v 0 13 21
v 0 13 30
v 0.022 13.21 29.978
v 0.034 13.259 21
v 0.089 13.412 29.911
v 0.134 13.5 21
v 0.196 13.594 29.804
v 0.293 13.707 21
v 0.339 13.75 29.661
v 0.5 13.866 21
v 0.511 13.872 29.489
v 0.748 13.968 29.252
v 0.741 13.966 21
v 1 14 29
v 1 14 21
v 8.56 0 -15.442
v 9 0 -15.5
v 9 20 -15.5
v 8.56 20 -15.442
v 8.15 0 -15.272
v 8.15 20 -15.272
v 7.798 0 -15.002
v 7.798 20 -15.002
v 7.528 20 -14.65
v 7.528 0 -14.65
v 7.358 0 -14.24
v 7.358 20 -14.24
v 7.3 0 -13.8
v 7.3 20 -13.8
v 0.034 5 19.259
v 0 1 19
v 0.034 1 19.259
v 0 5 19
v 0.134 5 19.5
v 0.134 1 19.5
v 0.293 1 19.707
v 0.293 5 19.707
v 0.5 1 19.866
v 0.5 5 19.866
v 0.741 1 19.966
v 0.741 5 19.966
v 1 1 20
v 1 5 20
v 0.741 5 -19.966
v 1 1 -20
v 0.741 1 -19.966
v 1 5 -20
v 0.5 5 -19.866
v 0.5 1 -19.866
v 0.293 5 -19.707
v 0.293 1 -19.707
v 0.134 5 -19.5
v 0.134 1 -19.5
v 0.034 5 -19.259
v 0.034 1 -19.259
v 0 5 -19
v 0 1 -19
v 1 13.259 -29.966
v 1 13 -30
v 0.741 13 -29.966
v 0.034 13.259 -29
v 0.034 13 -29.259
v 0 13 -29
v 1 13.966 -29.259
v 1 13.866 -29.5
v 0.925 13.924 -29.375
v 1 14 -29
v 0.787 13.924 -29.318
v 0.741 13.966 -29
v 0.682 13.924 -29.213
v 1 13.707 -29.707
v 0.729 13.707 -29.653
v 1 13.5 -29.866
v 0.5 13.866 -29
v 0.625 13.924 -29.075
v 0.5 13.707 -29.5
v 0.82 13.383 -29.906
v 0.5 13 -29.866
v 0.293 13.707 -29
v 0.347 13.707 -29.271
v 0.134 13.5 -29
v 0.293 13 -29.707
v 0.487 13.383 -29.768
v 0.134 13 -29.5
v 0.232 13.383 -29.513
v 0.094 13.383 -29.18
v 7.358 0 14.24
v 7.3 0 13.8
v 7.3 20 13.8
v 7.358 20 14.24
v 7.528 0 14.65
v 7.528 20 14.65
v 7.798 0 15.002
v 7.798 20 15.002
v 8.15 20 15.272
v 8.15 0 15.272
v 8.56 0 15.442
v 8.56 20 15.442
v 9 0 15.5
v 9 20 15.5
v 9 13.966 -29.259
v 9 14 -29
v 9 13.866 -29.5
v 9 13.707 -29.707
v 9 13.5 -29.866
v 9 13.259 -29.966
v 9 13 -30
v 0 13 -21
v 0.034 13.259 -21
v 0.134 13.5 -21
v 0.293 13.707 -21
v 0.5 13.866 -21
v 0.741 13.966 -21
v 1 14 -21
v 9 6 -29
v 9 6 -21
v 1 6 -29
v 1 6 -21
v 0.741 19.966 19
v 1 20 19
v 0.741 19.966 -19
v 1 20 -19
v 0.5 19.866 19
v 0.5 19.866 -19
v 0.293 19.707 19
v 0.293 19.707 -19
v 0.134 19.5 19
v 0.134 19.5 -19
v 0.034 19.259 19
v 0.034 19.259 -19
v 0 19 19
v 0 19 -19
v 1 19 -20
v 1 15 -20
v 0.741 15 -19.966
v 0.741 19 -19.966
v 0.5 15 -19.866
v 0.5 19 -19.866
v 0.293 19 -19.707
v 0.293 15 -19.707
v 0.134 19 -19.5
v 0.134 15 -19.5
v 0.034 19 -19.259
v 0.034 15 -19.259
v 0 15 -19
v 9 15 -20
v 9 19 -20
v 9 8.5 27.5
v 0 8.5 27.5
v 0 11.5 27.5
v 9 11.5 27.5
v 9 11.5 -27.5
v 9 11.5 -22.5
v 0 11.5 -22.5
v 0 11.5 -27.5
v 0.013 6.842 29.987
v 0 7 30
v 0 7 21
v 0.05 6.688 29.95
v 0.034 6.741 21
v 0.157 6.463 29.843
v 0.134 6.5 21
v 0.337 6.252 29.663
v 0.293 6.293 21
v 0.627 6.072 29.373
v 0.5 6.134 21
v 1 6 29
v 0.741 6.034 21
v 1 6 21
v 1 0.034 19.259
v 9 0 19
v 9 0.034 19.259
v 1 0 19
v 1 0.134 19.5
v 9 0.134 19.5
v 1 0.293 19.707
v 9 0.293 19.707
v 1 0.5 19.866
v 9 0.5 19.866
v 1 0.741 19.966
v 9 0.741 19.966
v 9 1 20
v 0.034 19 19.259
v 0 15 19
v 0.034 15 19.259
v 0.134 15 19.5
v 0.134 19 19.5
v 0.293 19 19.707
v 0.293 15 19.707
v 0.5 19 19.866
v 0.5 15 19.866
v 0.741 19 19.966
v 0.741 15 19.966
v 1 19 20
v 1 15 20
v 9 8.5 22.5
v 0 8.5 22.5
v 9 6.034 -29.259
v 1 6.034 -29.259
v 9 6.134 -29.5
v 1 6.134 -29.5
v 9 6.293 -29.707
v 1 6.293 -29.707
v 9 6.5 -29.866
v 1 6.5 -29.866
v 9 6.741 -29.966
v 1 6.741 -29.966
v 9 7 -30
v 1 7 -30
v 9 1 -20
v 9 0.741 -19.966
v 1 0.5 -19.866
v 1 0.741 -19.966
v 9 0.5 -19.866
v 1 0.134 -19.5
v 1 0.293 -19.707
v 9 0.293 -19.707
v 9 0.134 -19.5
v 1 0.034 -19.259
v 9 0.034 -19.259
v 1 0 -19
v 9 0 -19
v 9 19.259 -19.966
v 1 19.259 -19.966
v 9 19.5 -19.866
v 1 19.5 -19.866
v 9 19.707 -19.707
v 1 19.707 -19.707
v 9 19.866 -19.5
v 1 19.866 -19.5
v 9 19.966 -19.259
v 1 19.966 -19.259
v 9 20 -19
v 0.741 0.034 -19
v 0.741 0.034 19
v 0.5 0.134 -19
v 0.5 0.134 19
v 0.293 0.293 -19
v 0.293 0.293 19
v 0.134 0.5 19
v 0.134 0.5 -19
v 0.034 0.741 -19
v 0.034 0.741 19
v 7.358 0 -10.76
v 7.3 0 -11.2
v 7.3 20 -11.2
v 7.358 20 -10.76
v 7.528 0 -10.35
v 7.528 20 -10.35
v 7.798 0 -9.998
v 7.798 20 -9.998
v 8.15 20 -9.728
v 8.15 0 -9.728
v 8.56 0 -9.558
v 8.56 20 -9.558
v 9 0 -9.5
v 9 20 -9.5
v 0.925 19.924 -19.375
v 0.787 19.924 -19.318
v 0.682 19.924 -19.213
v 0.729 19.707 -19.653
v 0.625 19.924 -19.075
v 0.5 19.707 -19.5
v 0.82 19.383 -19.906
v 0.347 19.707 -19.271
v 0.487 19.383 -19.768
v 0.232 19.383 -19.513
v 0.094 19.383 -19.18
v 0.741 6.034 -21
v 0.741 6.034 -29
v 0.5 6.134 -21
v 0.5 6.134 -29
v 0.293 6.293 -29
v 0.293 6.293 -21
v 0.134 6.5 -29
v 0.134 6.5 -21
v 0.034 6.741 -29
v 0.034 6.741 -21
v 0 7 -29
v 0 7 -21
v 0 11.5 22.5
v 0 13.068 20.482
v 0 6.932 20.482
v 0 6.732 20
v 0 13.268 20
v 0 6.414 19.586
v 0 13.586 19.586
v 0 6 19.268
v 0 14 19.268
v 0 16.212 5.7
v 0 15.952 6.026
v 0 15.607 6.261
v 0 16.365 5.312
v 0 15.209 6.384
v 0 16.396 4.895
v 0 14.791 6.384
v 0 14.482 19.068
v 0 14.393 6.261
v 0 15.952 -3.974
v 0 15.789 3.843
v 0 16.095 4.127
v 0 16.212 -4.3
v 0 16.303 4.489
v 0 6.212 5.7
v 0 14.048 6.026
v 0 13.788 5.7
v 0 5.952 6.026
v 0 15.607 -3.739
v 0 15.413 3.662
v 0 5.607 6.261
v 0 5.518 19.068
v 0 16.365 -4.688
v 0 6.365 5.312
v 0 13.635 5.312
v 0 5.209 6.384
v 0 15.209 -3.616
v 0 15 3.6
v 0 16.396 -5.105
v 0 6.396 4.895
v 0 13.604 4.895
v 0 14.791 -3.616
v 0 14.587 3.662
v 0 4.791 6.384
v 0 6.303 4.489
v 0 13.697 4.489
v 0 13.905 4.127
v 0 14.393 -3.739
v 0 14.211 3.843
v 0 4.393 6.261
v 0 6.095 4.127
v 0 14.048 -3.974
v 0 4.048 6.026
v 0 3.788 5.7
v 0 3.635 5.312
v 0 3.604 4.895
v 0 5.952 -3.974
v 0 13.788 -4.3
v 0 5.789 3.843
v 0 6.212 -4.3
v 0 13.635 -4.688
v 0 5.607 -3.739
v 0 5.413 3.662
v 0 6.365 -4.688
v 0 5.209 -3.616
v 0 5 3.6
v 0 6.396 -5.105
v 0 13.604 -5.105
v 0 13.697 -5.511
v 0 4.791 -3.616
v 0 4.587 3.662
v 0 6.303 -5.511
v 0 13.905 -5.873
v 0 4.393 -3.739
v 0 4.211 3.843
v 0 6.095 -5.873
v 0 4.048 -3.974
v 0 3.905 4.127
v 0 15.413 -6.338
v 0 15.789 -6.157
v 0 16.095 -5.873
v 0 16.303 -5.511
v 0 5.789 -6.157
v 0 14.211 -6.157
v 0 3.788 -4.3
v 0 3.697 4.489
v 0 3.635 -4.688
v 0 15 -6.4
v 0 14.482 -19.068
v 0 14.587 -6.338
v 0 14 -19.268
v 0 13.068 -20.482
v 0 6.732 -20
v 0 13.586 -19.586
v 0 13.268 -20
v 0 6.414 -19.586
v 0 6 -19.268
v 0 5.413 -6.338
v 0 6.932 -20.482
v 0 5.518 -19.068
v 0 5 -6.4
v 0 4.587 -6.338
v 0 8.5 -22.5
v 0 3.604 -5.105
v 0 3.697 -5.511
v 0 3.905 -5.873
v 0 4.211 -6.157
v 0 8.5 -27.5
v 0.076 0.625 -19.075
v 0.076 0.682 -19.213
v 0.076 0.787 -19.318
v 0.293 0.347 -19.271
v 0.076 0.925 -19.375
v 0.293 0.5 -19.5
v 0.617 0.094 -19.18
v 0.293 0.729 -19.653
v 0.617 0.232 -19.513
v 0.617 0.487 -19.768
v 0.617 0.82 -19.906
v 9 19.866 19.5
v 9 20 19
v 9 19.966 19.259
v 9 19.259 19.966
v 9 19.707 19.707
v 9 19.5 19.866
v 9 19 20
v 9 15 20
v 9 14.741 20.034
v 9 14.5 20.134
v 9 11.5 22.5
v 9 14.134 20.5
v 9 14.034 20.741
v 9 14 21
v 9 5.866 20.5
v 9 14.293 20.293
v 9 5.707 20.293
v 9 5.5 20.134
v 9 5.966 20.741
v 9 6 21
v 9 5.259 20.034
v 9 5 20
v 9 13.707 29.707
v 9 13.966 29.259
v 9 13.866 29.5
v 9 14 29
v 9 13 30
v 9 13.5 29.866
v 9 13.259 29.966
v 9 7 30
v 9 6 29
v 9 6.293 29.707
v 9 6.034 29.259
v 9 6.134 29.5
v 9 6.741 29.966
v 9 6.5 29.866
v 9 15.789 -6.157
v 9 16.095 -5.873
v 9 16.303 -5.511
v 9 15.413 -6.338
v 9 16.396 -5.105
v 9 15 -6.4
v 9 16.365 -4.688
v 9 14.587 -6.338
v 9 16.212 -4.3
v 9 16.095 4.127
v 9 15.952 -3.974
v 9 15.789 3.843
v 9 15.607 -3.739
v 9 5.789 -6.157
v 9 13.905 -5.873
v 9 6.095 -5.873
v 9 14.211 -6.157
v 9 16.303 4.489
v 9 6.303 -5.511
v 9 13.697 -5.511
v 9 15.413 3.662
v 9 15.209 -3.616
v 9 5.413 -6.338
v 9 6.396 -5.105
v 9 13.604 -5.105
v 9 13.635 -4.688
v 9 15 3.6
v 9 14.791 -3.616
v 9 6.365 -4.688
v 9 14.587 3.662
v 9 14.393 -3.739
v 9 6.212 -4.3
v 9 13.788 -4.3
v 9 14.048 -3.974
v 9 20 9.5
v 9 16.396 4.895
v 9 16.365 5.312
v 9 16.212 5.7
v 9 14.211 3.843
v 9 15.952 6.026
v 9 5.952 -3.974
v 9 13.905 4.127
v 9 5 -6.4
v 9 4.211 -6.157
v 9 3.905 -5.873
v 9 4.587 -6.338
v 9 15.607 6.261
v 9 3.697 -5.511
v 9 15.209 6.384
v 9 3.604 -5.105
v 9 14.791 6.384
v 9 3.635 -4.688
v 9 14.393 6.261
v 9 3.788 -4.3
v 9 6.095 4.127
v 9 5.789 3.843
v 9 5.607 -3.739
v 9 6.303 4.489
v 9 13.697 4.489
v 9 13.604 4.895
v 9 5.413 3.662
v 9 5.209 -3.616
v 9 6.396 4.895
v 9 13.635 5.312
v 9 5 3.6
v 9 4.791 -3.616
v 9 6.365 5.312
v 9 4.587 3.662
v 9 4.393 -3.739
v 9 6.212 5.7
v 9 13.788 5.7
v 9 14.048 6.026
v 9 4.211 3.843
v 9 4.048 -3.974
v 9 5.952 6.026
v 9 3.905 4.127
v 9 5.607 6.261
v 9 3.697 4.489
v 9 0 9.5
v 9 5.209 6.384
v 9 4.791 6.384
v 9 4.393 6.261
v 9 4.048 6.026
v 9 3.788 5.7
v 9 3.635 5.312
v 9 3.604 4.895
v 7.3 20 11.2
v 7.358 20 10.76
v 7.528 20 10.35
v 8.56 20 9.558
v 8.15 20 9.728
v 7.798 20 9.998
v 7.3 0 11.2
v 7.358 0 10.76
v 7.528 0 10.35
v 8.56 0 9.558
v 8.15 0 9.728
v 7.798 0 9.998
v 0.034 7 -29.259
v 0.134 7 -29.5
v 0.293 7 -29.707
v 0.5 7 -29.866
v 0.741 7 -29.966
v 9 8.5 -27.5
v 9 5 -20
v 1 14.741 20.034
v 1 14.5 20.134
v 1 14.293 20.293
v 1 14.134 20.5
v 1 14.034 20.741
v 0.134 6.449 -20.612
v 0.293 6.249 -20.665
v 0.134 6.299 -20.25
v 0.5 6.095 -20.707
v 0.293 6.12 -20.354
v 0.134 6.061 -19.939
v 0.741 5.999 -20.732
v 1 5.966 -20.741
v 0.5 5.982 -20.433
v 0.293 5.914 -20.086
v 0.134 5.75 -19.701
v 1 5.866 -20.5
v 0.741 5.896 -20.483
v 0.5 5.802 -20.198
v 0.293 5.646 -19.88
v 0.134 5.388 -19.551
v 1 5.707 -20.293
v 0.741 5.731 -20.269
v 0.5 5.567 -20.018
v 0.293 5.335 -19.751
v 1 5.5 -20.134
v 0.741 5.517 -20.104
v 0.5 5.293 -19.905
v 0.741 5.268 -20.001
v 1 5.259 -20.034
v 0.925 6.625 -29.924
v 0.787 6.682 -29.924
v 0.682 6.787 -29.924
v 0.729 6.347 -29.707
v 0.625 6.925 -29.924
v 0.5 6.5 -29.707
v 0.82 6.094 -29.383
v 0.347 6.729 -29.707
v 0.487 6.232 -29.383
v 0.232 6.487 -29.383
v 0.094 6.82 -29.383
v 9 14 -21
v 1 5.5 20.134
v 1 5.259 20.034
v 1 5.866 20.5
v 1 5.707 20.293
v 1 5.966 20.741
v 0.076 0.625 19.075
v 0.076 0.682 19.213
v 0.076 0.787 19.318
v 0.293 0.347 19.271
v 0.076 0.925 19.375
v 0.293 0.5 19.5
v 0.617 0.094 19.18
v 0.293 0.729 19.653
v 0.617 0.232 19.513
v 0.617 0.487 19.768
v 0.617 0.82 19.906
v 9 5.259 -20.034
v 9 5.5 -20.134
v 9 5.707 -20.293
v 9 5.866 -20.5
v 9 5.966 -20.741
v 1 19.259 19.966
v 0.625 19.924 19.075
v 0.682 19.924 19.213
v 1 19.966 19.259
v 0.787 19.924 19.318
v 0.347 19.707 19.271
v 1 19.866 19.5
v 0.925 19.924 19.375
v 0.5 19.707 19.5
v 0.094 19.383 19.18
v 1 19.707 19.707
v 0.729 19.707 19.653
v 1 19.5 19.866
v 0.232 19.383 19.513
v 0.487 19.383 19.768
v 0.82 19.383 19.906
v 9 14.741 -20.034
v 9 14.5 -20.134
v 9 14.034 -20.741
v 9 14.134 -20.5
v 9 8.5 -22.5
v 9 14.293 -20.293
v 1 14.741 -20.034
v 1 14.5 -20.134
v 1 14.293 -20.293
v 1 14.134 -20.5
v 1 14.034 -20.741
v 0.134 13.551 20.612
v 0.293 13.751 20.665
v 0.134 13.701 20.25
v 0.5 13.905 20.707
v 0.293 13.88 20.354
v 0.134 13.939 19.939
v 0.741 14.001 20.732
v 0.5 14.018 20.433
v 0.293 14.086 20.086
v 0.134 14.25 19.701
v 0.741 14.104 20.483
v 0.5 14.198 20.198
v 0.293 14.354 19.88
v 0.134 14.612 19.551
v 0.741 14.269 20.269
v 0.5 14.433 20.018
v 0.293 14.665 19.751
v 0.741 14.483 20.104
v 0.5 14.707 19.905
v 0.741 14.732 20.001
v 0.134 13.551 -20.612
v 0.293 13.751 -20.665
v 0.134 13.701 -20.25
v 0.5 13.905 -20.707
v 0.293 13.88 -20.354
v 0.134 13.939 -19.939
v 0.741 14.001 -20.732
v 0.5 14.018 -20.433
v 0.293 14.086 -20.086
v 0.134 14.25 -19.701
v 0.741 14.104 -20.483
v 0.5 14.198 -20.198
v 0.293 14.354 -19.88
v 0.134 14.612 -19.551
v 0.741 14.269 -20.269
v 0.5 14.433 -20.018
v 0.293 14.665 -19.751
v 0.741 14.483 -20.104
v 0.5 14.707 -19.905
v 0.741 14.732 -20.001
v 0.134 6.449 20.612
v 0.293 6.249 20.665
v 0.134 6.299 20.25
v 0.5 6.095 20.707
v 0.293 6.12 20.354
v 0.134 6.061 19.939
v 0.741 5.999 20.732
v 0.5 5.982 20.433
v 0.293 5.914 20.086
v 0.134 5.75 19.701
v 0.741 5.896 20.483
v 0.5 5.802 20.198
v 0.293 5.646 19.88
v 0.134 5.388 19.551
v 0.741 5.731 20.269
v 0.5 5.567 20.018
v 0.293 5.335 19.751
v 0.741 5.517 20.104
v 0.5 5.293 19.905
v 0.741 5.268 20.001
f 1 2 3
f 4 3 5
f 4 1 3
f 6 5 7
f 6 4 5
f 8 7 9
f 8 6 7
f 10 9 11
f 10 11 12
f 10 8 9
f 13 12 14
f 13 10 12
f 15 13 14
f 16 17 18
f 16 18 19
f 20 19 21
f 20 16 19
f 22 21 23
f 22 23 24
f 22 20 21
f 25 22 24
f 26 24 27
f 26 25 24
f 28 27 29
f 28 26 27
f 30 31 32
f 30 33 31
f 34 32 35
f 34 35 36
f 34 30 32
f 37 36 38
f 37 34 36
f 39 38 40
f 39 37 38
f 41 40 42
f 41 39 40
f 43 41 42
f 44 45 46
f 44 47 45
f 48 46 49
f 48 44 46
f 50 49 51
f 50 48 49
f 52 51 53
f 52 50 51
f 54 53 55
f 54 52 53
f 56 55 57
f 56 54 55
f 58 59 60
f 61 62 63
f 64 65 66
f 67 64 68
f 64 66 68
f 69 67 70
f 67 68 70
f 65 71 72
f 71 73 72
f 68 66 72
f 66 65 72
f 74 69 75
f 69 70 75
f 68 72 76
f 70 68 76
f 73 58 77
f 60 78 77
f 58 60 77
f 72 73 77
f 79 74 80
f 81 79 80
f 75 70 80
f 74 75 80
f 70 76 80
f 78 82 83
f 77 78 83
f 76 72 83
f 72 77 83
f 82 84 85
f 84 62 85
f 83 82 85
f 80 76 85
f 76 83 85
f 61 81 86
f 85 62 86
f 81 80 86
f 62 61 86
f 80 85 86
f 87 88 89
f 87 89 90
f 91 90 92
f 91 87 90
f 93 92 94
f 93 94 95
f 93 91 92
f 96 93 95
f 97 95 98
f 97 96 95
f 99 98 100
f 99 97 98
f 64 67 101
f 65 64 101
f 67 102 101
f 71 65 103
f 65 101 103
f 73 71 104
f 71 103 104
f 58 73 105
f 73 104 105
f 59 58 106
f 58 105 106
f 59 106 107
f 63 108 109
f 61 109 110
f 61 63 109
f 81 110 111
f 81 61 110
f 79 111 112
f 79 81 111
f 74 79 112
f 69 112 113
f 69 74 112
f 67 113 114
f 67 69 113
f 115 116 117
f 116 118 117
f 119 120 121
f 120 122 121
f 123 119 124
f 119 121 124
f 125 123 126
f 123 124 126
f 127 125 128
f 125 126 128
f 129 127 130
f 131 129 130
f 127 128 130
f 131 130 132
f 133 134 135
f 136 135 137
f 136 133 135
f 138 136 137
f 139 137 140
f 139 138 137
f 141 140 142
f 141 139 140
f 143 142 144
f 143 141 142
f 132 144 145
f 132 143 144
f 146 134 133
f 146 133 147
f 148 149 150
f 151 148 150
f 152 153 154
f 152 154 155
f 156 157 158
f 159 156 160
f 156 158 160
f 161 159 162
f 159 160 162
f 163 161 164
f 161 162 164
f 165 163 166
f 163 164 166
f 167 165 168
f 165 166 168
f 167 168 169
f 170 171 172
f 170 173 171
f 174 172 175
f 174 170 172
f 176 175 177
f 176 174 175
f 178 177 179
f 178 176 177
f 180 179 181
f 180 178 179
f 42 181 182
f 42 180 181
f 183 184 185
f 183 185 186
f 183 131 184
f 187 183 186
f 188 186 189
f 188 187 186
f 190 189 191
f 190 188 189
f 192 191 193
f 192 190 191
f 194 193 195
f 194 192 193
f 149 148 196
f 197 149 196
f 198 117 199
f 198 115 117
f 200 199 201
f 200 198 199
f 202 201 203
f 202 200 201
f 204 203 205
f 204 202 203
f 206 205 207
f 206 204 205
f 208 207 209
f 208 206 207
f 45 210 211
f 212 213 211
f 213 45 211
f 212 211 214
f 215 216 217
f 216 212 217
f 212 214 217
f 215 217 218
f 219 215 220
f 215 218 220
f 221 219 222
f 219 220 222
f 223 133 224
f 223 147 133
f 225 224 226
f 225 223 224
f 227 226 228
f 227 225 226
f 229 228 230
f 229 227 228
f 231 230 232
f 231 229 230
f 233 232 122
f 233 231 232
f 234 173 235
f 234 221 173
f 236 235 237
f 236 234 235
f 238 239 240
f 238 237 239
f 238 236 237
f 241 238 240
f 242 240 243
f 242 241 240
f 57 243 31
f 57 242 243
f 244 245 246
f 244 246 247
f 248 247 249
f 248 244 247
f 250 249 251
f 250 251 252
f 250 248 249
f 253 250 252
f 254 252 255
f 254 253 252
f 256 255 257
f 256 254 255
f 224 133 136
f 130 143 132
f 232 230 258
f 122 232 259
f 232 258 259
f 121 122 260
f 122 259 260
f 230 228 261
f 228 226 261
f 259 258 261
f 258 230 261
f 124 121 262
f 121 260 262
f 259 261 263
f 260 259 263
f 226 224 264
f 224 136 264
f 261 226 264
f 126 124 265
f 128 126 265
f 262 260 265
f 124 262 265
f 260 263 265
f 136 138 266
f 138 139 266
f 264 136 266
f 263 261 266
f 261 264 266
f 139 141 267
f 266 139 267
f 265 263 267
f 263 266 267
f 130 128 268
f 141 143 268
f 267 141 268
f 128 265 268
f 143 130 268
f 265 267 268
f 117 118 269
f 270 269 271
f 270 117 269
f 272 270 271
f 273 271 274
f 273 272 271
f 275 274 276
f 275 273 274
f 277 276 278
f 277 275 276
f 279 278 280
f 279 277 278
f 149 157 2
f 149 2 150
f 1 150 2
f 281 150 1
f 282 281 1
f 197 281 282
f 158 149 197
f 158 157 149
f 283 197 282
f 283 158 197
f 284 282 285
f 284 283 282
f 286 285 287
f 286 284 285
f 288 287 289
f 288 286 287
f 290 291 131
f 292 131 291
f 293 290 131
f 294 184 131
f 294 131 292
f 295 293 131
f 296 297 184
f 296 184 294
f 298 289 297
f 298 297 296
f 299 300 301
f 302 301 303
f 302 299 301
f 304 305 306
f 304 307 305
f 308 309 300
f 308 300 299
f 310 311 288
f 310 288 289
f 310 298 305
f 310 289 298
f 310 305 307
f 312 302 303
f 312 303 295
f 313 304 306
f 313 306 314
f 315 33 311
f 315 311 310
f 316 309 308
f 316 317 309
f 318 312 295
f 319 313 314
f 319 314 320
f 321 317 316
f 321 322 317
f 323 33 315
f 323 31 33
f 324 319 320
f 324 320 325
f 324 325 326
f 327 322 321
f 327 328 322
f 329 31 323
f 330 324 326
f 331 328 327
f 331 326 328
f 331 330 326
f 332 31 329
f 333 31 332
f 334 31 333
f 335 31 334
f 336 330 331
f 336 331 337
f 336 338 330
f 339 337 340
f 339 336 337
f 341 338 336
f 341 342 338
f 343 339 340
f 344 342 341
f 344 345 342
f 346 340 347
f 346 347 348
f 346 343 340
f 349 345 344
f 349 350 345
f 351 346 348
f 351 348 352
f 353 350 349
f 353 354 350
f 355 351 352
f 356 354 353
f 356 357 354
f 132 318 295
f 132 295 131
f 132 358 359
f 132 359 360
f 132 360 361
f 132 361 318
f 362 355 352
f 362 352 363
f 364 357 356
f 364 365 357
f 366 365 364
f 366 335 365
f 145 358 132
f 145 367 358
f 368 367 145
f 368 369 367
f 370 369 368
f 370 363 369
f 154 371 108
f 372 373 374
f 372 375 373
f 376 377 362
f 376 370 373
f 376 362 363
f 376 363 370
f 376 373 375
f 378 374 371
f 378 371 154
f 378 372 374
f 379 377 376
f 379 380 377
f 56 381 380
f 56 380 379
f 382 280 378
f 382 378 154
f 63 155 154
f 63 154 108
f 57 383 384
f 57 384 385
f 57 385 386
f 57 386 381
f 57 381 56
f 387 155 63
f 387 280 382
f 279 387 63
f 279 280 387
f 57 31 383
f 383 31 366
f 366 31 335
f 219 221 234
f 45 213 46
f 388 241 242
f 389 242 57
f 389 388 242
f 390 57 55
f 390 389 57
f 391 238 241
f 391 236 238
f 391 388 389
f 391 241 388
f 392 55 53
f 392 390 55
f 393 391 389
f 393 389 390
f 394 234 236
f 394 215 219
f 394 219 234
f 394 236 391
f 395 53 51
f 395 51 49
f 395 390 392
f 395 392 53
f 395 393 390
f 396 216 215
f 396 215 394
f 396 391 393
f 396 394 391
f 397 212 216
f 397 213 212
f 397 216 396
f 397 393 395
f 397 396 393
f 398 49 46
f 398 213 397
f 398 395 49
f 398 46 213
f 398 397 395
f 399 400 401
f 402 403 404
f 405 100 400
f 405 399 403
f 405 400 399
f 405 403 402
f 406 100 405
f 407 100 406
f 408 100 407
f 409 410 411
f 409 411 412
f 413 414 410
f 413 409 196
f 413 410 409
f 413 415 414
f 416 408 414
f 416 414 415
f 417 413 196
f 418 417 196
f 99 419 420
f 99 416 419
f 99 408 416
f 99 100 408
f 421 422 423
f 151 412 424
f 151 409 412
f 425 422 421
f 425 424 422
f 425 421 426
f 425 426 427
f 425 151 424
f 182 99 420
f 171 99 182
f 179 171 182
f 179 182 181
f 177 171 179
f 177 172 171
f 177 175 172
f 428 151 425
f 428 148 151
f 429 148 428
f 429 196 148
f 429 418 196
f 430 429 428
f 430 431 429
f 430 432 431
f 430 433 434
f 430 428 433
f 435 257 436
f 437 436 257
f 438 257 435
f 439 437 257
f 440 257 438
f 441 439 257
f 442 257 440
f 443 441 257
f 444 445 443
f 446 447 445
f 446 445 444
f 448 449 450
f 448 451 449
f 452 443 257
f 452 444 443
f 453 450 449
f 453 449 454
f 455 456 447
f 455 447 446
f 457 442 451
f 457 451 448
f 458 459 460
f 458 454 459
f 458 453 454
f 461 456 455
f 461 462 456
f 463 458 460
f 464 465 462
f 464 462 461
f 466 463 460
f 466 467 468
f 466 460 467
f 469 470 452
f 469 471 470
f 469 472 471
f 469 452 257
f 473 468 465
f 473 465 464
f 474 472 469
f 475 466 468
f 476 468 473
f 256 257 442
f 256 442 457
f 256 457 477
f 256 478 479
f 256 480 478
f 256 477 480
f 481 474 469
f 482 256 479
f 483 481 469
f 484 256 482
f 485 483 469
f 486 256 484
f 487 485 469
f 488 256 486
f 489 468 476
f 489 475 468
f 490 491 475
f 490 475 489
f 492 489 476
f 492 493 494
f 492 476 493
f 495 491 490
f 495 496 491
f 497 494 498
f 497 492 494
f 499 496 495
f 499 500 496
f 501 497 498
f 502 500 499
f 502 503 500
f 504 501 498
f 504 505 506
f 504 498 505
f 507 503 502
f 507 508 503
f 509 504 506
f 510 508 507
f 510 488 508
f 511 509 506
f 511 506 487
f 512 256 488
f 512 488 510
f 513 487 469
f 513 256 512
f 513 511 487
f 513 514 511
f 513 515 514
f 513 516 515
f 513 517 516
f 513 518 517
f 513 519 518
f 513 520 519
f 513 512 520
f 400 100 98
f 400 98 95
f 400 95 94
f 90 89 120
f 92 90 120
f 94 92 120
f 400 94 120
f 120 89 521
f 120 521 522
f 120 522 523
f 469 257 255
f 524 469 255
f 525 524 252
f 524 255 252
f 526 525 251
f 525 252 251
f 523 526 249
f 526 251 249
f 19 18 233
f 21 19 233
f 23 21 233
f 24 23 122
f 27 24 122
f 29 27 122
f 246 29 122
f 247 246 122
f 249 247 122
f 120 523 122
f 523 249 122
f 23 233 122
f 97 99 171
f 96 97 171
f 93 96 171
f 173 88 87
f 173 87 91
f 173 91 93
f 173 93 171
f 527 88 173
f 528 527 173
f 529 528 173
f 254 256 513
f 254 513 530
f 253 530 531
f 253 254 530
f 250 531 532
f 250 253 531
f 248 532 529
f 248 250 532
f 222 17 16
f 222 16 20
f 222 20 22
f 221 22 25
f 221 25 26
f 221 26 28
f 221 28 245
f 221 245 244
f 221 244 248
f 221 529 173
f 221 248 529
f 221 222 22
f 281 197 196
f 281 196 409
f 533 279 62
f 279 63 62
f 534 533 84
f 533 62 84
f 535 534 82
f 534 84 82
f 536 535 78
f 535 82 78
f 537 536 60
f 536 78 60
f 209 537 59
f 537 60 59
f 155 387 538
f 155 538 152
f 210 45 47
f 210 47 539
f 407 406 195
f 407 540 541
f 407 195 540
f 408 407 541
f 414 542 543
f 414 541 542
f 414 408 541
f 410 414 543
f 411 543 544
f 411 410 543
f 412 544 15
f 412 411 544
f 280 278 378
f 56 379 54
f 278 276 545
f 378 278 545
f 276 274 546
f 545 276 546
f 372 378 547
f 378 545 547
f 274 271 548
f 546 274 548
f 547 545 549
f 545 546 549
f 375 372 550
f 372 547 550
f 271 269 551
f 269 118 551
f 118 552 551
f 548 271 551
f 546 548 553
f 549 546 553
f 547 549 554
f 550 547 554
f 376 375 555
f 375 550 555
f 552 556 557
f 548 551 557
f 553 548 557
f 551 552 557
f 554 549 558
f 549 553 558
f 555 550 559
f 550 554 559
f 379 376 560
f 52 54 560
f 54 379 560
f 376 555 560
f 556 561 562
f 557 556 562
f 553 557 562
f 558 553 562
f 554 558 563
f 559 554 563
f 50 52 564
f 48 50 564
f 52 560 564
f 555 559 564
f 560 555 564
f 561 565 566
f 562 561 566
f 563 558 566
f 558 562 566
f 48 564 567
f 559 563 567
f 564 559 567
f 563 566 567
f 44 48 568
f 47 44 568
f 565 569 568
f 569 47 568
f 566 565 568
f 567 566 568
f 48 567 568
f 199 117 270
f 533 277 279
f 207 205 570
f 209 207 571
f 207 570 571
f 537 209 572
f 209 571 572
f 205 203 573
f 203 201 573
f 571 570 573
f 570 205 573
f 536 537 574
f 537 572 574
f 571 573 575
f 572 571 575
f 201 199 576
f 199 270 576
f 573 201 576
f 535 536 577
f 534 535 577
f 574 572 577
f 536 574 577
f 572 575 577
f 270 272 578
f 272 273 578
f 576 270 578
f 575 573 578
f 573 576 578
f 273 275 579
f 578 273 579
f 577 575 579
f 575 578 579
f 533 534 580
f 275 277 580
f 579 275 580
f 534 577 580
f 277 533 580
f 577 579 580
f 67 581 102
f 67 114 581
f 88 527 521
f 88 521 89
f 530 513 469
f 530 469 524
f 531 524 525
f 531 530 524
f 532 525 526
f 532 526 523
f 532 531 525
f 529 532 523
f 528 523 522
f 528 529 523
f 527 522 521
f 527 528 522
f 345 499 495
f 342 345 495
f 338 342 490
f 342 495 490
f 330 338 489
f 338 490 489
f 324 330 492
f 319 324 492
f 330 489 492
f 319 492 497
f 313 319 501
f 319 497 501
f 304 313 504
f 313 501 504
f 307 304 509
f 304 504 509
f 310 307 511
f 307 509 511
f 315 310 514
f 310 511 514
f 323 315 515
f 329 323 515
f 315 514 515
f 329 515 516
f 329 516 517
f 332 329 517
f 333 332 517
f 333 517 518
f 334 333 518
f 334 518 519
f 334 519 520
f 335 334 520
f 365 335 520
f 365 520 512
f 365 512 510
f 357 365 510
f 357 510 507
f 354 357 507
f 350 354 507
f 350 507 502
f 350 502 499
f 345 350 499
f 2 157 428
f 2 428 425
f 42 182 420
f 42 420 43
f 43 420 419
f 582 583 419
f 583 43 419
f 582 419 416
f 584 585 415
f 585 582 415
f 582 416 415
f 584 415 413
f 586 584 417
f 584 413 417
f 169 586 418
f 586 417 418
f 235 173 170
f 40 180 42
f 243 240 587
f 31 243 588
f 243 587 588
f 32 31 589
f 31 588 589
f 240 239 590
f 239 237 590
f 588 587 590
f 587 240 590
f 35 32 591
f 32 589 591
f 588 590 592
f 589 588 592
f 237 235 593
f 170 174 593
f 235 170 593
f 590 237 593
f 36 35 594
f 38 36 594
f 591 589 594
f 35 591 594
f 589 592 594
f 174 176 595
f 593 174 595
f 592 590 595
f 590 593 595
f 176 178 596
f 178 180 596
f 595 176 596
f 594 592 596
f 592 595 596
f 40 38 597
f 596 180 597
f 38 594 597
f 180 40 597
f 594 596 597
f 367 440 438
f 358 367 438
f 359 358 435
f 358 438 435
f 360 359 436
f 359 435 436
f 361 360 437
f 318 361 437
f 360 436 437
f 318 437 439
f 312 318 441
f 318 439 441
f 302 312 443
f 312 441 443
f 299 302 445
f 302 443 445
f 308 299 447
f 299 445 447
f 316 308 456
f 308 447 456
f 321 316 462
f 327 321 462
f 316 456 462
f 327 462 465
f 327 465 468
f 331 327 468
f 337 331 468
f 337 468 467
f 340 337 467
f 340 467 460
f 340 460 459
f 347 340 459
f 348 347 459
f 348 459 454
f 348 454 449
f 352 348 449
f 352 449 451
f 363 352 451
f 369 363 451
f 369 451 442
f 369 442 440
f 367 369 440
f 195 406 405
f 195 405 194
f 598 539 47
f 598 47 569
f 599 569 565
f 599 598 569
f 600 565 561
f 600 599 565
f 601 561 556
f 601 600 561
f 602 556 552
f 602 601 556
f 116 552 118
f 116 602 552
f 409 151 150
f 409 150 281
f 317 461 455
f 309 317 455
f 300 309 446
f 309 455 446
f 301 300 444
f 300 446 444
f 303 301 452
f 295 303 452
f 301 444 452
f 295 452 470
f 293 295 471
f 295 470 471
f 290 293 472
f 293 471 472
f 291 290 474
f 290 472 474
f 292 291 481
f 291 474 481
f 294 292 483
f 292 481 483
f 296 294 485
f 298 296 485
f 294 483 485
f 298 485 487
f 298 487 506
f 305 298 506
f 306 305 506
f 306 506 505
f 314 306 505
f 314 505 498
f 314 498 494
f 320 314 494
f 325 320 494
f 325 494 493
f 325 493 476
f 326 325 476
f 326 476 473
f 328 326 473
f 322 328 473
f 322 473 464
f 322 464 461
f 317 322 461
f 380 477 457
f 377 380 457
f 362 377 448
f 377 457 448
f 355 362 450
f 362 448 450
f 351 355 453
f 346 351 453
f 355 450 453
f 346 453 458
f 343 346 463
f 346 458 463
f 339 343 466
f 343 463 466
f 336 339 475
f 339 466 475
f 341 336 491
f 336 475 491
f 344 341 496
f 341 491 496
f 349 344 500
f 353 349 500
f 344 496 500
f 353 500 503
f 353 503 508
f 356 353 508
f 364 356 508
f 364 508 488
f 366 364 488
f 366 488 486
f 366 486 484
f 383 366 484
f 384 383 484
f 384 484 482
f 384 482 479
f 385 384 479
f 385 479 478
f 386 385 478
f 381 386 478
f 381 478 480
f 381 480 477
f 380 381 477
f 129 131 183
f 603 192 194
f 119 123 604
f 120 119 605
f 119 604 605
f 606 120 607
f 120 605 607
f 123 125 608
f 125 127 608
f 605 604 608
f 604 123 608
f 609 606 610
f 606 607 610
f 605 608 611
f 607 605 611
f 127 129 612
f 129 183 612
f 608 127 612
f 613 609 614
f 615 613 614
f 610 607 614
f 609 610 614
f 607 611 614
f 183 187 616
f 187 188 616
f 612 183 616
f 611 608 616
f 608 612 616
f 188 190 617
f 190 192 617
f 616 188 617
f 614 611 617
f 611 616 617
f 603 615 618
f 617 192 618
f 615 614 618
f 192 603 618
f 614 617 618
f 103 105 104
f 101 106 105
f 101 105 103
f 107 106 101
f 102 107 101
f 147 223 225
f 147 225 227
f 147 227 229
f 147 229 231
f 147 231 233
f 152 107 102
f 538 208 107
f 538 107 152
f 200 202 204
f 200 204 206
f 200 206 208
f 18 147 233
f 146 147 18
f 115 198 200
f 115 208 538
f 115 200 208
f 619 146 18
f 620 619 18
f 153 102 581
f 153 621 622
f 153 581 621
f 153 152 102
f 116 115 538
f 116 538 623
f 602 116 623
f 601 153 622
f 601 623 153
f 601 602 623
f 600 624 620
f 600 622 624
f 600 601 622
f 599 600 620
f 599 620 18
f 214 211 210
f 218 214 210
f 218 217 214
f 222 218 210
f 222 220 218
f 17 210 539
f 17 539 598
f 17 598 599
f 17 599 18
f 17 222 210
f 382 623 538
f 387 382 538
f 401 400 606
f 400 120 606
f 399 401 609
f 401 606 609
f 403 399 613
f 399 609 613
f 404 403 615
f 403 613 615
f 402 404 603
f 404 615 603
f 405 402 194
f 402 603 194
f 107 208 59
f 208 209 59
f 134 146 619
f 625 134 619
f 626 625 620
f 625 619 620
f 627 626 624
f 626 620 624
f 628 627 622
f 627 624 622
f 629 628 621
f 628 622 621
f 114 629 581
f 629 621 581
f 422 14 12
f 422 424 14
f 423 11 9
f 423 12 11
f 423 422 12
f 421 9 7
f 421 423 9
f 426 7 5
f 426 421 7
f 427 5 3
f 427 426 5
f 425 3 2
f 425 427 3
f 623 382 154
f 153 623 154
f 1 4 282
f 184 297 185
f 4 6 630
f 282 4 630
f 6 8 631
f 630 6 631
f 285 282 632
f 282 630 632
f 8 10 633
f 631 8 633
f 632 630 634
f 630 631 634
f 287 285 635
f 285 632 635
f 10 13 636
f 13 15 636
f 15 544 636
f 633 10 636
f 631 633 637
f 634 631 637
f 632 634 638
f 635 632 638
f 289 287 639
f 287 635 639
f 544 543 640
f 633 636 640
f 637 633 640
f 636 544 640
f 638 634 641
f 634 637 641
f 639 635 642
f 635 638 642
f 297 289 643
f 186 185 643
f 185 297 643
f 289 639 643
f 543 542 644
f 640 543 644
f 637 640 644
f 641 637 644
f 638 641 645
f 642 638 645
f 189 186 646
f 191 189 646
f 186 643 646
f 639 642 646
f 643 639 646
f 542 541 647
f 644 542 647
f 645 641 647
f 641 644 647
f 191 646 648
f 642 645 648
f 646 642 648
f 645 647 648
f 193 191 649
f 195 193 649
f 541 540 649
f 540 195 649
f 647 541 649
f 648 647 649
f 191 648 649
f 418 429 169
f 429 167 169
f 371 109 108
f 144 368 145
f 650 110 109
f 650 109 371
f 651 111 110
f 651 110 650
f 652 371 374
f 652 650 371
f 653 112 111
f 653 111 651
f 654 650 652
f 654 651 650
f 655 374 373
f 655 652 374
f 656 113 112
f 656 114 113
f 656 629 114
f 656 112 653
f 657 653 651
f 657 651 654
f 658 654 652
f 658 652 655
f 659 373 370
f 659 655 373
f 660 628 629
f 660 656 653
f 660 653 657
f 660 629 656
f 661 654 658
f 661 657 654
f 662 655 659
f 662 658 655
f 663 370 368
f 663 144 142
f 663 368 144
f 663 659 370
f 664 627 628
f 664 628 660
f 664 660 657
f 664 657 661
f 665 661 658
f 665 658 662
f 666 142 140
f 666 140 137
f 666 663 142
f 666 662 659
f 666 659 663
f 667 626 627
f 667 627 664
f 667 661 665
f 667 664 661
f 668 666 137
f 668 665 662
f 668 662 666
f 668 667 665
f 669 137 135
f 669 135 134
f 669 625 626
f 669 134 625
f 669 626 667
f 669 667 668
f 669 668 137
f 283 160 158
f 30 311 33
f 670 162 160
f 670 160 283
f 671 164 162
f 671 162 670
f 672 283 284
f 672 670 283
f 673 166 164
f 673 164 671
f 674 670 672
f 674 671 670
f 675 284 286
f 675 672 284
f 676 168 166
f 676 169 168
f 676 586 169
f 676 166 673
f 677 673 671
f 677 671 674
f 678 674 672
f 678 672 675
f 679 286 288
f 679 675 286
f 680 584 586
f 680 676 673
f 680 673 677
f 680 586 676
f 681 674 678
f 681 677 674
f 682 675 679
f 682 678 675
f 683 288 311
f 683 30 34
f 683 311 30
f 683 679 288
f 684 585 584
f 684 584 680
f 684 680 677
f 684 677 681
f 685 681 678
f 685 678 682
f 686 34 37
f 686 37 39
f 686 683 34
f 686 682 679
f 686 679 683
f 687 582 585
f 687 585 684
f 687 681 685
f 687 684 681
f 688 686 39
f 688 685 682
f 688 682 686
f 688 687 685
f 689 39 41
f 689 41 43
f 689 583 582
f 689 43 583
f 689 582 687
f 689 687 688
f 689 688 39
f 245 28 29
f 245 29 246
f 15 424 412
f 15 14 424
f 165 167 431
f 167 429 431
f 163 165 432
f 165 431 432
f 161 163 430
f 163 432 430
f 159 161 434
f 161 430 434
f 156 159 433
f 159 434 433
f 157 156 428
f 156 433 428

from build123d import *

# Parameters (mm, degrees)
BASE_DEPTH           = 20
SKETCH2_R            = 1.4
SCREW_HOLES_DEPTH    = 30.681644159
SKETCH3_W            = 10
SKETCH3_H            = 8
SKETCH3_W_2          = 5
SKETCH3_H_2          = 3
ZIP_TIE_SLOTS_DEPTH  = 9
F_1MM_EDGE_FILLETS_R = 1


with BuildPart() as part:
    # Sketch1 → Base (new body)
    with BuildSketch(Plane(origin=(0, 0, 0), x_dir=(1, 0, 0), z_dir=(0, 1, 0))):
        with BuildLine():
            Line((9, 20), (9, 15.5))
            ThreePointArc((9, 15.5), (7.797918472, 15.002081528), (7.3, 13.8))
            Line((7.3, 13.8), (7.3, 11.2))
            ThreePointArc((7.3, 11.2), (7.797918472, 9.997918472), (9, 9.5))
            Line((9, 9.5), (9, -9.5))
            ThreePointArc((9, -9.5), (7.797918472, -9.997918472), (7.3, -11.2))
            Line((7.3, -11.2), (7.3, -13.8))
            ThreePointArc((7.3, -13.8), (7.797918472, -15.002081528), (9, -15.5))
            Line((9, -15.5), (9, -20))
            Line((9, -20), (0, -20))
            Line((0, -20), (0, 20))
            Line((0, 20), (9, 20))
        make_face()
    extrude(amount=BASE_DEPTH)

    # Sketch2 → Screw Holes (cut, through all)
    with BuildSketch(Plane(origin=(9, 0, 0), x_dir=(0, 0, -1), z_dir=(1, 0, 0))):
        with Locations((-5, 15)):
            Circle(SKETCH2_R)
        with Locations((5, 15)):
            Circle(SKETCH2_R)
        with Locations((5, 5)):
            Circle(SKETCH2_R)
        with Locations((-5, 5)):
            Circle(SKETCH2_R)
    extrude(amount=-SCREW_HOLES_DEPTH, mode=Mode.SUBTRACT)

    # Sketch3 → Zip Tie Slots (add)
    # profile 1 of 2: a face of its own
    with BuildSketch(Plane(origin=(0, 0, 0), x_dir=(0, 0, -1), z_dir=(1, 0, 0))):
        with Locations((-25, 10)):
            Rectangle(SKETCH3_W, SKETCH3_H)
        with Locations((-25, 10)):
            Rectangle(SKETCH3_W_2, SKETCH3_H_2, mode=Mode.SUBTRACT)
    # profile 2 of 2: a face of its own
    with BuildSketch(Plane(origin=(0, 0, 0), x_dir=(0, 0, -1), z_dir=(1, 0, 0))):
        with Locations((25, 10)):
            Rectangle(SKETCH3_W, SKETCH3_H)
        with Locations((25, 10)):
            Rectangle(SKETCH3_W_2, SKETCH3_H_2, mode=Mode.SUBTRACT)
    extrude(amount=ZIP_TIE_SLOTS_DEPTH)

    # 1mm Edge Fillets
    f_1mm_edge_fillets_edges = [part.edges().sort_by_distance(p)[0] for p in [
        (4.5, 0, -20),
        (4.5, 0, 20),
        (0, 0, 0),
        (0, 17, -20),
        (0, 17, 20),
        (4.5, 20, -20),
        (0, 20, 0),
        (0, 3, 20),
        (4.5, 6, 20),
        (4.5, 14, 20),
        (0, 14, 25),
        (4.5, 14, 30),
        (4.5, 6, 30),
        (0, 6, 25),
        (0, 3, -20),
        (4.5, 14, -20),
        (4.5, 6, -20),
        (0, 6, -25),
        (4.5, 6, -30),
        (0, 10, -30),
        (4.5, 14, -30),
        (0, 14, -25),
        (4.5, 20, 20),
    ]]
    fillet(f_1mm_edge_fillets_edges, radius=F_1MM_EDGE_FILLETS_R)


solid = part.part
